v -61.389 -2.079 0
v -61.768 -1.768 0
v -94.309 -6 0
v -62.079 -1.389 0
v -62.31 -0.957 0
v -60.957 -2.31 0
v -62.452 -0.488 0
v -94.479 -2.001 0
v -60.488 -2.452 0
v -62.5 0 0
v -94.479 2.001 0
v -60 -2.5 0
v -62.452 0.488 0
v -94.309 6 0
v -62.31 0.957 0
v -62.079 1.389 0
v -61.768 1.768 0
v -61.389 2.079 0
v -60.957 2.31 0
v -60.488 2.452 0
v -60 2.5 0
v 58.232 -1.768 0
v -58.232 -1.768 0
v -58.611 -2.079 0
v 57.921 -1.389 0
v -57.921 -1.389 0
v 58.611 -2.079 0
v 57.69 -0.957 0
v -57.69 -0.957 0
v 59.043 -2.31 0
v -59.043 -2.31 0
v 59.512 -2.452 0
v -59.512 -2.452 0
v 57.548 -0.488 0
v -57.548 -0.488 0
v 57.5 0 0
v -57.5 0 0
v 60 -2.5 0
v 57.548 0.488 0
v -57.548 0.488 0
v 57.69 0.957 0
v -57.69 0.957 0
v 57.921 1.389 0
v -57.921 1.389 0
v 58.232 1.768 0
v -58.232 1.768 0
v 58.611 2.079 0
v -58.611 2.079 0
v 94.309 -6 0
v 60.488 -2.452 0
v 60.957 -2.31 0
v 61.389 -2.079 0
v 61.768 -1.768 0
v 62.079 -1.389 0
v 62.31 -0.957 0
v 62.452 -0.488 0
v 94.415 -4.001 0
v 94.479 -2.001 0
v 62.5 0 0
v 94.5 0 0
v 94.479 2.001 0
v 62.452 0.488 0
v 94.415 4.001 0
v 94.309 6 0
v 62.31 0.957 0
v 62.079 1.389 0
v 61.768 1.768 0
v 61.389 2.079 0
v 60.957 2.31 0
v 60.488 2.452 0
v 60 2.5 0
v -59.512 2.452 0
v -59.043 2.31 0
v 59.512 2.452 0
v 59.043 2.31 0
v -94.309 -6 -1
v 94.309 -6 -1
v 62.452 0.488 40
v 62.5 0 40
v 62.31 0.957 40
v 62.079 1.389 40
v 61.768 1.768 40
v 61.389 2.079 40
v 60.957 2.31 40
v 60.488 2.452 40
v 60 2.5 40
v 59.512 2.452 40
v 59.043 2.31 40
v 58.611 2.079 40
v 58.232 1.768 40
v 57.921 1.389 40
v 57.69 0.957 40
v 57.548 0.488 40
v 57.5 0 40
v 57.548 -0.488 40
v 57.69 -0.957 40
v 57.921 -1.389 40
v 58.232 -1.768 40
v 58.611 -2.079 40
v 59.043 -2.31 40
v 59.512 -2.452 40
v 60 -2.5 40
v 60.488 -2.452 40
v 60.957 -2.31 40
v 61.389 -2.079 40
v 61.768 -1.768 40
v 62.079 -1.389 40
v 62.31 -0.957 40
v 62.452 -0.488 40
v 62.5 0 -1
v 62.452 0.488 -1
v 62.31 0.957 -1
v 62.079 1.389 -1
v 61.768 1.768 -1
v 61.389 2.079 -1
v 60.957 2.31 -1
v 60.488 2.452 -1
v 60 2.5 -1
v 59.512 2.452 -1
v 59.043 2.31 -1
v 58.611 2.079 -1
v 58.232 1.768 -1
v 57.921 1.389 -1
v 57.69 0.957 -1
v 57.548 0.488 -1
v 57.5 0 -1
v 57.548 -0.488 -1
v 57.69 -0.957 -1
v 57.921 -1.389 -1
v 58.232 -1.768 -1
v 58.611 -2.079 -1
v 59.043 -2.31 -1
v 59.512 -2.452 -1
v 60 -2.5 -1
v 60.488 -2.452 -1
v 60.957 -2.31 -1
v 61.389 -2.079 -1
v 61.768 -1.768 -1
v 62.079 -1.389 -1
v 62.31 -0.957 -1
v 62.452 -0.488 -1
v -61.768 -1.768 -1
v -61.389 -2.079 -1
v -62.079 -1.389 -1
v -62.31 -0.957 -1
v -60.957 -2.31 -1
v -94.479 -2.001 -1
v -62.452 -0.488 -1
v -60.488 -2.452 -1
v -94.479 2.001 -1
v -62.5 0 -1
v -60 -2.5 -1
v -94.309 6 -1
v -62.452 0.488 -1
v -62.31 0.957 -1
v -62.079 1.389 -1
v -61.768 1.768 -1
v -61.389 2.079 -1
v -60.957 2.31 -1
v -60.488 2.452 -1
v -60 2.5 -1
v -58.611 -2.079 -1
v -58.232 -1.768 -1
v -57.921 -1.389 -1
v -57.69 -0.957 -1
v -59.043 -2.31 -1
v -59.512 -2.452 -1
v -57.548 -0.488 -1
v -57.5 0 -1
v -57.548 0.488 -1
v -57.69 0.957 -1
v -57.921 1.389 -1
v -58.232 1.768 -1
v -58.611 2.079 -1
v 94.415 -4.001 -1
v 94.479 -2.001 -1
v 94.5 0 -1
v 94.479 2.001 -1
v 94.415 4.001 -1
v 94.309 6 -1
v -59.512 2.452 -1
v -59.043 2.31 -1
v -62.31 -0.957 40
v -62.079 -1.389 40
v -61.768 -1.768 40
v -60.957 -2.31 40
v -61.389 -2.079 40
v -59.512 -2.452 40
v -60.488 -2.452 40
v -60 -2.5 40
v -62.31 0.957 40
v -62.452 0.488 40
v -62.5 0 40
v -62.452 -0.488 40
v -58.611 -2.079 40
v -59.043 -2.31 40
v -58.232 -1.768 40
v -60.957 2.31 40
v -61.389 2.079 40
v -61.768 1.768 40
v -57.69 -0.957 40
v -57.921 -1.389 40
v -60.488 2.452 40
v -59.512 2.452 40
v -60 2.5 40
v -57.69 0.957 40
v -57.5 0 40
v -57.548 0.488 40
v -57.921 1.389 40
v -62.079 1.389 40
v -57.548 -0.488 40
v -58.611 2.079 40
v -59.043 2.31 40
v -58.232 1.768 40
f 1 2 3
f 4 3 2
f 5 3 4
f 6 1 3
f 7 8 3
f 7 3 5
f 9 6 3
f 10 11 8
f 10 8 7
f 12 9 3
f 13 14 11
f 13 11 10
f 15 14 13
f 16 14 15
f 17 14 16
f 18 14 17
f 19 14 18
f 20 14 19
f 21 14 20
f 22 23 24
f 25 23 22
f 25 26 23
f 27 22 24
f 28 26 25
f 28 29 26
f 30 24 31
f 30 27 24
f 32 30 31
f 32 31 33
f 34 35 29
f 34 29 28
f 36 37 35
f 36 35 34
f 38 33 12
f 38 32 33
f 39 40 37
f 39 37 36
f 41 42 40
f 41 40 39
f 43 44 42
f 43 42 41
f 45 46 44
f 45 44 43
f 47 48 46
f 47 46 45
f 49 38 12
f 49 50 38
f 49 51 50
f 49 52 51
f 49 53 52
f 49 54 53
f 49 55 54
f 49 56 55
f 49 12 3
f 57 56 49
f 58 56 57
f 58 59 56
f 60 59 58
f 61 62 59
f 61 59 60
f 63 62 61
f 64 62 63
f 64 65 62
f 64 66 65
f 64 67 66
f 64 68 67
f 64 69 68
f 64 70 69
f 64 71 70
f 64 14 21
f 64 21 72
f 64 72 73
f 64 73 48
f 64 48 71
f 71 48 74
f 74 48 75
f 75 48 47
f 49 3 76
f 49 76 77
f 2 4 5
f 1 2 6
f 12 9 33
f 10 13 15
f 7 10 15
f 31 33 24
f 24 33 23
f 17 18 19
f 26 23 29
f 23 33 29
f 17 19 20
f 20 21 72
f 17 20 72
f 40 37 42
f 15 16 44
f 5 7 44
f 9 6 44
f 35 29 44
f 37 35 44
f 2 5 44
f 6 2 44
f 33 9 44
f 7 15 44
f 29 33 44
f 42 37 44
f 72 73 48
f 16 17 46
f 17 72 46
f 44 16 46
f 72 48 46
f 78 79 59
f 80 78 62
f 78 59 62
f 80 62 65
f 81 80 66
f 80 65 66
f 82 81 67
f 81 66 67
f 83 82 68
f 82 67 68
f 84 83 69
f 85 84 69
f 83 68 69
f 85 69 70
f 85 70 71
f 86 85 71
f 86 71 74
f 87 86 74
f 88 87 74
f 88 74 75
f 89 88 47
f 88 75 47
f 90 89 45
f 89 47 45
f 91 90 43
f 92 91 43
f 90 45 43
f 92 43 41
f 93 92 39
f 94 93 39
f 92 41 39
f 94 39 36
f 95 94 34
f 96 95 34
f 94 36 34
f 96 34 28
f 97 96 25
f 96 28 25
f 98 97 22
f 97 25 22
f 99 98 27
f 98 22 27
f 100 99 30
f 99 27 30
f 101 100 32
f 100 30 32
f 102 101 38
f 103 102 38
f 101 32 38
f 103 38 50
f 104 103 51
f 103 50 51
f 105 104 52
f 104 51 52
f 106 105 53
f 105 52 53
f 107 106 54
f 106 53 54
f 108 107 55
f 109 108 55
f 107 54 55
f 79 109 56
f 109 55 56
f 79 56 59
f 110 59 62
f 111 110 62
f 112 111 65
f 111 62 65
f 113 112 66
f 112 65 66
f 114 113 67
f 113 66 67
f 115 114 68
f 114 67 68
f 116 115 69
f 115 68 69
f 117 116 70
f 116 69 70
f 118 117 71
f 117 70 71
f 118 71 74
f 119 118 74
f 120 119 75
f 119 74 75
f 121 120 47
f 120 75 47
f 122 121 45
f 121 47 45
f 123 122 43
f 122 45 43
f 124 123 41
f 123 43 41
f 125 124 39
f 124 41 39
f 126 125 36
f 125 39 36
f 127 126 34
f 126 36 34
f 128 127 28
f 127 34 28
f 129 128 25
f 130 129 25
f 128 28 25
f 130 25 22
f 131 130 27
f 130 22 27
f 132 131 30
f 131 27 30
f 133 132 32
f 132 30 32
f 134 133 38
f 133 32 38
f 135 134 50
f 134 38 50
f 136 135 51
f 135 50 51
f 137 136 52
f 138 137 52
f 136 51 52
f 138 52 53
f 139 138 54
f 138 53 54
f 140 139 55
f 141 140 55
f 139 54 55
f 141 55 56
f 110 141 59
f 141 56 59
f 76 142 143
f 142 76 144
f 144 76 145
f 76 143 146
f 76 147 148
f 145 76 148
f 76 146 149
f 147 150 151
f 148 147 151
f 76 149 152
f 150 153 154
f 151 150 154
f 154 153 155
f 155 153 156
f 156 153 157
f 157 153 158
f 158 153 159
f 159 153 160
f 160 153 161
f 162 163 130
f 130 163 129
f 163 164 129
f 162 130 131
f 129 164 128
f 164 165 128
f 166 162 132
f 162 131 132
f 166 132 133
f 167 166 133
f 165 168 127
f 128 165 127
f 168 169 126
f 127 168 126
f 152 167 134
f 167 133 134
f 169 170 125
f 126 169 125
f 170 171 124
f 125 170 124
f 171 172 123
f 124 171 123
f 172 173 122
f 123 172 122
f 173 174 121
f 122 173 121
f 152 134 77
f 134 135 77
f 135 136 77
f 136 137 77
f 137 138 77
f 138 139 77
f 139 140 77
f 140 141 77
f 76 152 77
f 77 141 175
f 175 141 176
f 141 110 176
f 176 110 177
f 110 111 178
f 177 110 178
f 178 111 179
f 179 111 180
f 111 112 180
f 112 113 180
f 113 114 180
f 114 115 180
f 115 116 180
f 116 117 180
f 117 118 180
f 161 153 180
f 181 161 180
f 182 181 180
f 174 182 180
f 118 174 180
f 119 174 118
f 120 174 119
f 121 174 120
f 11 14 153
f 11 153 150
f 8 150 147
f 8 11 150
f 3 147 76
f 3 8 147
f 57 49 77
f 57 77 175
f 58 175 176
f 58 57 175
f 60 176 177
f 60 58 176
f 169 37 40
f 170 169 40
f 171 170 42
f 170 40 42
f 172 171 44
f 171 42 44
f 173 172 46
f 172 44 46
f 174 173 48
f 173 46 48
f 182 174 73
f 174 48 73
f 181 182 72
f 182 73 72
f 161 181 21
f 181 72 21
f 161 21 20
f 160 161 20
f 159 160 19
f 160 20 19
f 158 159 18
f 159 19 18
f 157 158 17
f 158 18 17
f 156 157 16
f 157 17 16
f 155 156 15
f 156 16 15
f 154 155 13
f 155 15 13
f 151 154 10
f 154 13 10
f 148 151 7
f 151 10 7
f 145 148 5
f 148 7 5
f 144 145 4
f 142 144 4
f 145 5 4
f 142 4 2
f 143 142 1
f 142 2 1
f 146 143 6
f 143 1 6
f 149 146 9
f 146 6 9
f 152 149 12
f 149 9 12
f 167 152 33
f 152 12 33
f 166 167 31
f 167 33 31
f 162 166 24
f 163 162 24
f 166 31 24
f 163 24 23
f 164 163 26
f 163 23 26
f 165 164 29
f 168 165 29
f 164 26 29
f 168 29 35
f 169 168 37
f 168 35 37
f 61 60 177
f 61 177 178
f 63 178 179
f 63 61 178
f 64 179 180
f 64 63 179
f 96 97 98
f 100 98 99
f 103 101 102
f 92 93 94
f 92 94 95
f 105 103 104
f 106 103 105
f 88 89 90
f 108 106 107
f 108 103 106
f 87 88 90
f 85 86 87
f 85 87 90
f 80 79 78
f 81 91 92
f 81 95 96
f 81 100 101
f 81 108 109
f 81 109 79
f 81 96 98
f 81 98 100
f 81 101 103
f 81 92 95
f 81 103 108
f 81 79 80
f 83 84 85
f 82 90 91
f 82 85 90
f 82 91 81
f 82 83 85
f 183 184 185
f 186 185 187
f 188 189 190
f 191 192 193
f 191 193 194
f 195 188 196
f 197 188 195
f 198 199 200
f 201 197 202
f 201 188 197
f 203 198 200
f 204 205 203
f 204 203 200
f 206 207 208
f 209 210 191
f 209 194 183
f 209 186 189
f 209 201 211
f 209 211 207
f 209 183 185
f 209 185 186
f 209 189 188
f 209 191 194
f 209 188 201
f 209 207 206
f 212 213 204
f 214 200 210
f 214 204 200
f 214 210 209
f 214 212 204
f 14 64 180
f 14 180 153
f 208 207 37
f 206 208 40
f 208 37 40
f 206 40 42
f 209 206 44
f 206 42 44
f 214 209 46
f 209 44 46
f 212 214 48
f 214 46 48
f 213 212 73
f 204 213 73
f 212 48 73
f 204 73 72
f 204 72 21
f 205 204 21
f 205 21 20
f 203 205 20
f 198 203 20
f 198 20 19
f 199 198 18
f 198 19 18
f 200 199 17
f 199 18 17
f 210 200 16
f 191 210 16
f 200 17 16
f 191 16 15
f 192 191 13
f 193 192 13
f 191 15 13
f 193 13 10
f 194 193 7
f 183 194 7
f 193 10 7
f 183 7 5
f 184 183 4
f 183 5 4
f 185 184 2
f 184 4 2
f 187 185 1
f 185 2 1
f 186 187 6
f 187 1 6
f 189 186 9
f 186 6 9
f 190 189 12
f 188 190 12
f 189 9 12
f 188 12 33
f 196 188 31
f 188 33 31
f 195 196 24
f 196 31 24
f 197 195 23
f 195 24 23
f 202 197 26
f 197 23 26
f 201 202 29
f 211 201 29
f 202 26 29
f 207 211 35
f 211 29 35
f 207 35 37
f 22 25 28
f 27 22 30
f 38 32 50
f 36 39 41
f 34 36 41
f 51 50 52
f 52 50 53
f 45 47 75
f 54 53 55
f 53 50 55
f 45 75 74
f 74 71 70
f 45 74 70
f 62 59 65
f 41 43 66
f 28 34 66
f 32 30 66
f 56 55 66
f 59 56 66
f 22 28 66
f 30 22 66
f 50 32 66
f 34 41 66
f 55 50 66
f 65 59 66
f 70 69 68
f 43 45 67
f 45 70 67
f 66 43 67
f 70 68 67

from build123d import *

# Parameters (mm, degrees)
F0_R     = 2.5
F1_DEPTH = 40
F2_DEPTH = 1


# Not quite as in the source:
# - a feature names something its author has since deleted; it is built from what else it names


with BuildPart() as f1:
    # F0 (on Top) → F1 (new body)
    with BuildSketch(Plane.XY):
        with Locations((-60, 0)):
            Circle(F0_R)
    extrude(amount=F1_DEPTH)


with BuildPart() as f1b:
    # F0 (on Top) → F1, piece 2 (new body)
    with BuildSketch(Plane.XY):
        with Locations((60, 0)):
            Circle(F0_R)
    extrude(amount=F1_DEPTH)


with BuildPart() as f2:
    # F0 (on Top) → F2 (new body)
    with BuildSketch(Plane.XY):
        with BuildLine():
            ThreePointArc((94.3093314577, -6), (94.4523208364, -3.0015143883), (94.5, 0))
            ThreePointArc((94.5, 0), (94.4523208364, 3.0015143883), (94.3093314577, 6))
            Line((94.3093314577, 6), (-94.3093314577, 6))
            ThreePointArc((-94.3093314577, 6), (-94.5, 0), (-94.3093314577, -6))
            Line((-94.3093314577, -6), (94.3093314577, -6))
        make_face()
        with Locations((-60, 0)):
            Circle(F0_R, mode=Mode.SUBTRACT)
        with Locations((60, 0)):
            Circle(F0_R, mode=Mode.SUBTRACT)
    extrude(amount=-F2_DEPTH)


solid = Compound([f1.part, f1b.part, f2.part])
